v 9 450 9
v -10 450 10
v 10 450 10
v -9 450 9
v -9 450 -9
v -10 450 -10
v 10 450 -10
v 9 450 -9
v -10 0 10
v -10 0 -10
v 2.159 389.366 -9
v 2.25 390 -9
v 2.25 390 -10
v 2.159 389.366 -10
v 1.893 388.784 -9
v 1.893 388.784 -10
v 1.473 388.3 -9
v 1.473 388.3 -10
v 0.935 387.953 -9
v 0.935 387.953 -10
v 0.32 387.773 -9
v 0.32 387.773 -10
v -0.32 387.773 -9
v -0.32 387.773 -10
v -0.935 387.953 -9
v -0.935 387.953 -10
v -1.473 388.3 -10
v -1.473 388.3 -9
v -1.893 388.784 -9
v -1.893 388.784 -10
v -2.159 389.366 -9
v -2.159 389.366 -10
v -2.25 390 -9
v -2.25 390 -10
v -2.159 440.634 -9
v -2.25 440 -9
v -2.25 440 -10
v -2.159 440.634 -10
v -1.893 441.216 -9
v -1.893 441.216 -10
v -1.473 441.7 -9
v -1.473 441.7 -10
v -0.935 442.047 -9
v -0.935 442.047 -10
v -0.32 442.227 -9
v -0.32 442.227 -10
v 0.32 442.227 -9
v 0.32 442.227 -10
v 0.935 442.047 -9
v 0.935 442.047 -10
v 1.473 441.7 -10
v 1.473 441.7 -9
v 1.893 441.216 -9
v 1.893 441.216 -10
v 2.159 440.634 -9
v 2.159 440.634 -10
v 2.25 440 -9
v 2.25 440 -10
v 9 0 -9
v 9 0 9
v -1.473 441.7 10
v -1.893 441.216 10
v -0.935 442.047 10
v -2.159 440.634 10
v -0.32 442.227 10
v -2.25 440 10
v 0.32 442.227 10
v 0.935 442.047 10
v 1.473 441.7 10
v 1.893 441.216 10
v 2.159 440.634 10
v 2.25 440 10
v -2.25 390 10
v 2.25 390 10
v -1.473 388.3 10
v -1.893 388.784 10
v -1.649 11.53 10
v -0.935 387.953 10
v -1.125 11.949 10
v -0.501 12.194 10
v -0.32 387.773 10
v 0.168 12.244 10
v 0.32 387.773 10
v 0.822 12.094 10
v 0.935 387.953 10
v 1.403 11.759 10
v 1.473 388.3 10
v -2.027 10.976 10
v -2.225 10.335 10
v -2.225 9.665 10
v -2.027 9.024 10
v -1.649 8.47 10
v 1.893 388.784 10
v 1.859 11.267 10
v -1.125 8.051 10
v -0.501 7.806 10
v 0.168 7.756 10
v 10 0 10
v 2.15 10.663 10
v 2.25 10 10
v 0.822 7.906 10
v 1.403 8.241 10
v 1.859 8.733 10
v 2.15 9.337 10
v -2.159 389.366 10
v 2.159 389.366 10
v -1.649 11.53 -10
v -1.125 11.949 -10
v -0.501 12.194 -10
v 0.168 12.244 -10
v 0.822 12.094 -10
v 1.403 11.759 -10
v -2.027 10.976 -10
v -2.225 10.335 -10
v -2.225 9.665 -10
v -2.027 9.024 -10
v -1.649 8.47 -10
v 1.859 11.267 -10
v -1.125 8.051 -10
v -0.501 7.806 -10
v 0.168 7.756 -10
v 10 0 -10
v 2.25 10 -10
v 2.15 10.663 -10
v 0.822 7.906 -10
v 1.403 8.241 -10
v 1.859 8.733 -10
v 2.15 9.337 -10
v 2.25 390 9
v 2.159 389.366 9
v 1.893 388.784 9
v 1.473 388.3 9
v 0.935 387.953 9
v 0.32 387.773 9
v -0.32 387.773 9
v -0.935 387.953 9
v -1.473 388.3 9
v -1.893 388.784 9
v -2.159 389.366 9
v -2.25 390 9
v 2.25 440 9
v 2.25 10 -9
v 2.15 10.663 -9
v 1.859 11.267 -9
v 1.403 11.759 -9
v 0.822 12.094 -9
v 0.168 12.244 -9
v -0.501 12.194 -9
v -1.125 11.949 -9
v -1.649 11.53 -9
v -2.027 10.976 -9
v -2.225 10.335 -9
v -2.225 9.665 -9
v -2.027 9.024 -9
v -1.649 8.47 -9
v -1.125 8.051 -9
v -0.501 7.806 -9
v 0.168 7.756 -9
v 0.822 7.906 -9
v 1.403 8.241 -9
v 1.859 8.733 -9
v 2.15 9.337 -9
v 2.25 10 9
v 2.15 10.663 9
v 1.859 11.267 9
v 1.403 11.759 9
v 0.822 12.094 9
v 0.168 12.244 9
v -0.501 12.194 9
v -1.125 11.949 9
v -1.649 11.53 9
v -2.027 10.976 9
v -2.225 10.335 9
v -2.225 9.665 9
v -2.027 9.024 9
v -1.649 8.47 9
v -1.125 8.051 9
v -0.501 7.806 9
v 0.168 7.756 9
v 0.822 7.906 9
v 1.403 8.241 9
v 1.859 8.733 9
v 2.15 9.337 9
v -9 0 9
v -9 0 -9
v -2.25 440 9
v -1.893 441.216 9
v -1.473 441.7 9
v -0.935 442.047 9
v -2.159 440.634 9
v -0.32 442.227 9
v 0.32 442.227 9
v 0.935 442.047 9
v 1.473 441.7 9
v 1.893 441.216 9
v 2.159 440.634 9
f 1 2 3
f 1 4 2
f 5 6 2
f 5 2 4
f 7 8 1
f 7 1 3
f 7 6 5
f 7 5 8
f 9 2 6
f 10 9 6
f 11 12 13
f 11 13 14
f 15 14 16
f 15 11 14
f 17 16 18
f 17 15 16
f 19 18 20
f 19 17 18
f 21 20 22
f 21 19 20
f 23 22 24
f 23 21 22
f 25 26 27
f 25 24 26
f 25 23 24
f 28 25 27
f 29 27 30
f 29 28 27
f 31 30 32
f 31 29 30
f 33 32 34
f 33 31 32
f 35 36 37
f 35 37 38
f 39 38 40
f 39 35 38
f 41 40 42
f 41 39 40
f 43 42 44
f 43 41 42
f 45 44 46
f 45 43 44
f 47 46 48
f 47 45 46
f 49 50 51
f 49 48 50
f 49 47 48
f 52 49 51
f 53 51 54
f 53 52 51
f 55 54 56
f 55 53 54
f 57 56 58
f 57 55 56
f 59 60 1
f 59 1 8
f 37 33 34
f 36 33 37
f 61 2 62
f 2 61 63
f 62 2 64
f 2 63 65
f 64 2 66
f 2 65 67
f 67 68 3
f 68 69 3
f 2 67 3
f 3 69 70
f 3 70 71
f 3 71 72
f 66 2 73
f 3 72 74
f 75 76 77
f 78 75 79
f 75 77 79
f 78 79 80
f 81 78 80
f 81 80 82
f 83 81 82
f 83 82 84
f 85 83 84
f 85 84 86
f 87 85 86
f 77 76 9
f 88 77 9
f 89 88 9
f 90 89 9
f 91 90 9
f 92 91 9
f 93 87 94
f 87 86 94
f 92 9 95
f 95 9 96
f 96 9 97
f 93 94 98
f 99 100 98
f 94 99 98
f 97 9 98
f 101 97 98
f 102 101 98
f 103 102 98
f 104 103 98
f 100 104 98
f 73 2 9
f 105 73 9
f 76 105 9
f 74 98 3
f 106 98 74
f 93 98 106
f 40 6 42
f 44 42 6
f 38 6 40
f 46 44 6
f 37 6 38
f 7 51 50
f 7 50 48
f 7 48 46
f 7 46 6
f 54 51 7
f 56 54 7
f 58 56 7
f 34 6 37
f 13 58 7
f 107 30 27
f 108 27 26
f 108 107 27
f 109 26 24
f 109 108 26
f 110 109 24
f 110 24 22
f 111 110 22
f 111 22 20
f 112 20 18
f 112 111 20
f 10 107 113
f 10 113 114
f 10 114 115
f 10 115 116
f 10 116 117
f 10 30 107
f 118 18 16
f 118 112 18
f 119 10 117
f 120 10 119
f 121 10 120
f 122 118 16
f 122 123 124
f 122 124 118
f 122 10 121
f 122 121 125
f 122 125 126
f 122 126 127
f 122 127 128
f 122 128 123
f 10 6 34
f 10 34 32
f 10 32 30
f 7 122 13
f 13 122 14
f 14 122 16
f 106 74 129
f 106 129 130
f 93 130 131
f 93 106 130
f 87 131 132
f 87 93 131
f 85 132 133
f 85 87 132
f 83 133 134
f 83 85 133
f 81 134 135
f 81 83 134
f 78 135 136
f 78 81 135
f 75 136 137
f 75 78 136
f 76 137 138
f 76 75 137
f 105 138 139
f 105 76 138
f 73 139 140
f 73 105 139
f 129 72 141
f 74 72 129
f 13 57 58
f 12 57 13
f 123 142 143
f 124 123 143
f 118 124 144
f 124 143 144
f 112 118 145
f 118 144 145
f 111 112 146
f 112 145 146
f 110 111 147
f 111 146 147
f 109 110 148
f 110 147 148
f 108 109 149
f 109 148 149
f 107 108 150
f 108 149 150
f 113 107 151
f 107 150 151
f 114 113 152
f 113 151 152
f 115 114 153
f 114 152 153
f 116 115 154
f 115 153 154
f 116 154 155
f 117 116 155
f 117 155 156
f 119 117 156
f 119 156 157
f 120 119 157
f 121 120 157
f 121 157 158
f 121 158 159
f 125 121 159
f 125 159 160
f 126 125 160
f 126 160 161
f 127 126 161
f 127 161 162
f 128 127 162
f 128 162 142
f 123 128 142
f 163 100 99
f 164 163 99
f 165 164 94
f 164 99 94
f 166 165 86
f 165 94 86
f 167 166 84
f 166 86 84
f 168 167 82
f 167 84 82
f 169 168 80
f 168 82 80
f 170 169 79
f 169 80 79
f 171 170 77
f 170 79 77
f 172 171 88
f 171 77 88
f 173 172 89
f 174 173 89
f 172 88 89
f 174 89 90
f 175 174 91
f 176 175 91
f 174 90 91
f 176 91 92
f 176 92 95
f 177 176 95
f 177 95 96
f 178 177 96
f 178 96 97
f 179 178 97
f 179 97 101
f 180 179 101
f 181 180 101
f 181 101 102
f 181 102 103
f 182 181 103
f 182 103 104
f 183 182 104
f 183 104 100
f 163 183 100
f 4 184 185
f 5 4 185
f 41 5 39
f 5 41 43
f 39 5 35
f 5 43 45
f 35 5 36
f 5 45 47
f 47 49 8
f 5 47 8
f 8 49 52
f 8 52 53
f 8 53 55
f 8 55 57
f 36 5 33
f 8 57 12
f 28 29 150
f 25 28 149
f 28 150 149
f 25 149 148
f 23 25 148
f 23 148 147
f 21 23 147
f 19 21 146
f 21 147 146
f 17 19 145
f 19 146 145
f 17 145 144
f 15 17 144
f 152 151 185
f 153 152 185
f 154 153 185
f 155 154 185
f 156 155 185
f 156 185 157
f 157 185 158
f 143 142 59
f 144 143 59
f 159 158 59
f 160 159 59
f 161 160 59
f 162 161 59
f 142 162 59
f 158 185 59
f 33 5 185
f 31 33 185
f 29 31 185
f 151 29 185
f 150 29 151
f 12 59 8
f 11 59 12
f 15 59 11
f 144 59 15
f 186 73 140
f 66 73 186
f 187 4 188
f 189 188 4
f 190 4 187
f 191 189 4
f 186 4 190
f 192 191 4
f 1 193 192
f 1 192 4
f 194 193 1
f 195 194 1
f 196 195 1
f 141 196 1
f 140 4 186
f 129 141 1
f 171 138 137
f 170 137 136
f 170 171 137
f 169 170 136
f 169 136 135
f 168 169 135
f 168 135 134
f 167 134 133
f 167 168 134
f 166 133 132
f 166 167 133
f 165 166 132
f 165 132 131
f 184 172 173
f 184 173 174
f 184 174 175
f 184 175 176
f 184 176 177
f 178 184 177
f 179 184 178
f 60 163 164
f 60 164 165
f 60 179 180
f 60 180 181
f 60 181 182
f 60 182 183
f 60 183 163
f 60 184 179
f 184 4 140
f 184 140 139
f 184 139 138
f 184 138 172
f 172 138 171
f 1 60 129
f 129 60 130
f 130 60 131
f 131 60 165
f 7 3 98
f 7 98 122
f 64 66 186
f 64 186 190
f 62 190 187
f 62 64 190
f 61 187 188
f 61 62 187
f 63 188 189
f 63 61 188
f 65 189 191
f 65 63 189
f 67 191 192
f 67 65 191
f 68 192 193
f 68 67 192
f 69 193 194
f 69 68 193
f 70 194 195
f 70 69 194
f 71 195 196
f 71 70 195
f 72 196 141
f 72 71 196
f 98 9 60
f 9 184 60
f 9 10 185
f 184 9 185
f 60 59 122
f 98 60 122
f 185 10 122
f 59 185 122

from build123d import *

# Parameters (mm, degrees)
SKETCH1_W           = 20
SKETCH1_H           = 20
SKETCH1_W_2         = 18
SKETCH1_H_2         = 18
BOSS_EXTRUDE1_DEPTH = 450
SKETCH2_R           = 2.25
CUT_EXTRUDE1_DEPTH  = 451.555213043


with BuildPart() as part:
    # Sketch1 → Boss-Extrude1 (new body)
    with BuildSketch(Plane(origin=(0, 0, 0), x_dir=(1, 0, 0), z_dir=(0, 1, 0))):
        Rectangle(SKETCH1_W, SKETCH1_H)
        Rectangle(SKETCH1_W_2, SKETCH1_H_2, mode=Mode.SUBTRACT)
    extrude(amount=BOSS_EXTRUDE1_DEPTH)

    # Sketch2 → Cut-Extrude1 (cut, through all)
    with BuildSketch(Plane.XY.offset(10)):
        with Locations((0, 10)):
            Circle(SKETCH2_R)
        with BuildLine():
            Line((2.25, 440), (2.25, 390))
            ThreePointArc((2.25, 390), (0, 387.75), (-2.25, 390))
            Line((-2.25, 390), (-2.25, 440))
            ThreePointArc((-2.25, 440), (0, 442.25), (2.25, 440))
        make_face()
    extrude(amount=-CUT_EXTRUDE1_DEPTH, mode=Mode.SUBTRACT)


solid = part.part
